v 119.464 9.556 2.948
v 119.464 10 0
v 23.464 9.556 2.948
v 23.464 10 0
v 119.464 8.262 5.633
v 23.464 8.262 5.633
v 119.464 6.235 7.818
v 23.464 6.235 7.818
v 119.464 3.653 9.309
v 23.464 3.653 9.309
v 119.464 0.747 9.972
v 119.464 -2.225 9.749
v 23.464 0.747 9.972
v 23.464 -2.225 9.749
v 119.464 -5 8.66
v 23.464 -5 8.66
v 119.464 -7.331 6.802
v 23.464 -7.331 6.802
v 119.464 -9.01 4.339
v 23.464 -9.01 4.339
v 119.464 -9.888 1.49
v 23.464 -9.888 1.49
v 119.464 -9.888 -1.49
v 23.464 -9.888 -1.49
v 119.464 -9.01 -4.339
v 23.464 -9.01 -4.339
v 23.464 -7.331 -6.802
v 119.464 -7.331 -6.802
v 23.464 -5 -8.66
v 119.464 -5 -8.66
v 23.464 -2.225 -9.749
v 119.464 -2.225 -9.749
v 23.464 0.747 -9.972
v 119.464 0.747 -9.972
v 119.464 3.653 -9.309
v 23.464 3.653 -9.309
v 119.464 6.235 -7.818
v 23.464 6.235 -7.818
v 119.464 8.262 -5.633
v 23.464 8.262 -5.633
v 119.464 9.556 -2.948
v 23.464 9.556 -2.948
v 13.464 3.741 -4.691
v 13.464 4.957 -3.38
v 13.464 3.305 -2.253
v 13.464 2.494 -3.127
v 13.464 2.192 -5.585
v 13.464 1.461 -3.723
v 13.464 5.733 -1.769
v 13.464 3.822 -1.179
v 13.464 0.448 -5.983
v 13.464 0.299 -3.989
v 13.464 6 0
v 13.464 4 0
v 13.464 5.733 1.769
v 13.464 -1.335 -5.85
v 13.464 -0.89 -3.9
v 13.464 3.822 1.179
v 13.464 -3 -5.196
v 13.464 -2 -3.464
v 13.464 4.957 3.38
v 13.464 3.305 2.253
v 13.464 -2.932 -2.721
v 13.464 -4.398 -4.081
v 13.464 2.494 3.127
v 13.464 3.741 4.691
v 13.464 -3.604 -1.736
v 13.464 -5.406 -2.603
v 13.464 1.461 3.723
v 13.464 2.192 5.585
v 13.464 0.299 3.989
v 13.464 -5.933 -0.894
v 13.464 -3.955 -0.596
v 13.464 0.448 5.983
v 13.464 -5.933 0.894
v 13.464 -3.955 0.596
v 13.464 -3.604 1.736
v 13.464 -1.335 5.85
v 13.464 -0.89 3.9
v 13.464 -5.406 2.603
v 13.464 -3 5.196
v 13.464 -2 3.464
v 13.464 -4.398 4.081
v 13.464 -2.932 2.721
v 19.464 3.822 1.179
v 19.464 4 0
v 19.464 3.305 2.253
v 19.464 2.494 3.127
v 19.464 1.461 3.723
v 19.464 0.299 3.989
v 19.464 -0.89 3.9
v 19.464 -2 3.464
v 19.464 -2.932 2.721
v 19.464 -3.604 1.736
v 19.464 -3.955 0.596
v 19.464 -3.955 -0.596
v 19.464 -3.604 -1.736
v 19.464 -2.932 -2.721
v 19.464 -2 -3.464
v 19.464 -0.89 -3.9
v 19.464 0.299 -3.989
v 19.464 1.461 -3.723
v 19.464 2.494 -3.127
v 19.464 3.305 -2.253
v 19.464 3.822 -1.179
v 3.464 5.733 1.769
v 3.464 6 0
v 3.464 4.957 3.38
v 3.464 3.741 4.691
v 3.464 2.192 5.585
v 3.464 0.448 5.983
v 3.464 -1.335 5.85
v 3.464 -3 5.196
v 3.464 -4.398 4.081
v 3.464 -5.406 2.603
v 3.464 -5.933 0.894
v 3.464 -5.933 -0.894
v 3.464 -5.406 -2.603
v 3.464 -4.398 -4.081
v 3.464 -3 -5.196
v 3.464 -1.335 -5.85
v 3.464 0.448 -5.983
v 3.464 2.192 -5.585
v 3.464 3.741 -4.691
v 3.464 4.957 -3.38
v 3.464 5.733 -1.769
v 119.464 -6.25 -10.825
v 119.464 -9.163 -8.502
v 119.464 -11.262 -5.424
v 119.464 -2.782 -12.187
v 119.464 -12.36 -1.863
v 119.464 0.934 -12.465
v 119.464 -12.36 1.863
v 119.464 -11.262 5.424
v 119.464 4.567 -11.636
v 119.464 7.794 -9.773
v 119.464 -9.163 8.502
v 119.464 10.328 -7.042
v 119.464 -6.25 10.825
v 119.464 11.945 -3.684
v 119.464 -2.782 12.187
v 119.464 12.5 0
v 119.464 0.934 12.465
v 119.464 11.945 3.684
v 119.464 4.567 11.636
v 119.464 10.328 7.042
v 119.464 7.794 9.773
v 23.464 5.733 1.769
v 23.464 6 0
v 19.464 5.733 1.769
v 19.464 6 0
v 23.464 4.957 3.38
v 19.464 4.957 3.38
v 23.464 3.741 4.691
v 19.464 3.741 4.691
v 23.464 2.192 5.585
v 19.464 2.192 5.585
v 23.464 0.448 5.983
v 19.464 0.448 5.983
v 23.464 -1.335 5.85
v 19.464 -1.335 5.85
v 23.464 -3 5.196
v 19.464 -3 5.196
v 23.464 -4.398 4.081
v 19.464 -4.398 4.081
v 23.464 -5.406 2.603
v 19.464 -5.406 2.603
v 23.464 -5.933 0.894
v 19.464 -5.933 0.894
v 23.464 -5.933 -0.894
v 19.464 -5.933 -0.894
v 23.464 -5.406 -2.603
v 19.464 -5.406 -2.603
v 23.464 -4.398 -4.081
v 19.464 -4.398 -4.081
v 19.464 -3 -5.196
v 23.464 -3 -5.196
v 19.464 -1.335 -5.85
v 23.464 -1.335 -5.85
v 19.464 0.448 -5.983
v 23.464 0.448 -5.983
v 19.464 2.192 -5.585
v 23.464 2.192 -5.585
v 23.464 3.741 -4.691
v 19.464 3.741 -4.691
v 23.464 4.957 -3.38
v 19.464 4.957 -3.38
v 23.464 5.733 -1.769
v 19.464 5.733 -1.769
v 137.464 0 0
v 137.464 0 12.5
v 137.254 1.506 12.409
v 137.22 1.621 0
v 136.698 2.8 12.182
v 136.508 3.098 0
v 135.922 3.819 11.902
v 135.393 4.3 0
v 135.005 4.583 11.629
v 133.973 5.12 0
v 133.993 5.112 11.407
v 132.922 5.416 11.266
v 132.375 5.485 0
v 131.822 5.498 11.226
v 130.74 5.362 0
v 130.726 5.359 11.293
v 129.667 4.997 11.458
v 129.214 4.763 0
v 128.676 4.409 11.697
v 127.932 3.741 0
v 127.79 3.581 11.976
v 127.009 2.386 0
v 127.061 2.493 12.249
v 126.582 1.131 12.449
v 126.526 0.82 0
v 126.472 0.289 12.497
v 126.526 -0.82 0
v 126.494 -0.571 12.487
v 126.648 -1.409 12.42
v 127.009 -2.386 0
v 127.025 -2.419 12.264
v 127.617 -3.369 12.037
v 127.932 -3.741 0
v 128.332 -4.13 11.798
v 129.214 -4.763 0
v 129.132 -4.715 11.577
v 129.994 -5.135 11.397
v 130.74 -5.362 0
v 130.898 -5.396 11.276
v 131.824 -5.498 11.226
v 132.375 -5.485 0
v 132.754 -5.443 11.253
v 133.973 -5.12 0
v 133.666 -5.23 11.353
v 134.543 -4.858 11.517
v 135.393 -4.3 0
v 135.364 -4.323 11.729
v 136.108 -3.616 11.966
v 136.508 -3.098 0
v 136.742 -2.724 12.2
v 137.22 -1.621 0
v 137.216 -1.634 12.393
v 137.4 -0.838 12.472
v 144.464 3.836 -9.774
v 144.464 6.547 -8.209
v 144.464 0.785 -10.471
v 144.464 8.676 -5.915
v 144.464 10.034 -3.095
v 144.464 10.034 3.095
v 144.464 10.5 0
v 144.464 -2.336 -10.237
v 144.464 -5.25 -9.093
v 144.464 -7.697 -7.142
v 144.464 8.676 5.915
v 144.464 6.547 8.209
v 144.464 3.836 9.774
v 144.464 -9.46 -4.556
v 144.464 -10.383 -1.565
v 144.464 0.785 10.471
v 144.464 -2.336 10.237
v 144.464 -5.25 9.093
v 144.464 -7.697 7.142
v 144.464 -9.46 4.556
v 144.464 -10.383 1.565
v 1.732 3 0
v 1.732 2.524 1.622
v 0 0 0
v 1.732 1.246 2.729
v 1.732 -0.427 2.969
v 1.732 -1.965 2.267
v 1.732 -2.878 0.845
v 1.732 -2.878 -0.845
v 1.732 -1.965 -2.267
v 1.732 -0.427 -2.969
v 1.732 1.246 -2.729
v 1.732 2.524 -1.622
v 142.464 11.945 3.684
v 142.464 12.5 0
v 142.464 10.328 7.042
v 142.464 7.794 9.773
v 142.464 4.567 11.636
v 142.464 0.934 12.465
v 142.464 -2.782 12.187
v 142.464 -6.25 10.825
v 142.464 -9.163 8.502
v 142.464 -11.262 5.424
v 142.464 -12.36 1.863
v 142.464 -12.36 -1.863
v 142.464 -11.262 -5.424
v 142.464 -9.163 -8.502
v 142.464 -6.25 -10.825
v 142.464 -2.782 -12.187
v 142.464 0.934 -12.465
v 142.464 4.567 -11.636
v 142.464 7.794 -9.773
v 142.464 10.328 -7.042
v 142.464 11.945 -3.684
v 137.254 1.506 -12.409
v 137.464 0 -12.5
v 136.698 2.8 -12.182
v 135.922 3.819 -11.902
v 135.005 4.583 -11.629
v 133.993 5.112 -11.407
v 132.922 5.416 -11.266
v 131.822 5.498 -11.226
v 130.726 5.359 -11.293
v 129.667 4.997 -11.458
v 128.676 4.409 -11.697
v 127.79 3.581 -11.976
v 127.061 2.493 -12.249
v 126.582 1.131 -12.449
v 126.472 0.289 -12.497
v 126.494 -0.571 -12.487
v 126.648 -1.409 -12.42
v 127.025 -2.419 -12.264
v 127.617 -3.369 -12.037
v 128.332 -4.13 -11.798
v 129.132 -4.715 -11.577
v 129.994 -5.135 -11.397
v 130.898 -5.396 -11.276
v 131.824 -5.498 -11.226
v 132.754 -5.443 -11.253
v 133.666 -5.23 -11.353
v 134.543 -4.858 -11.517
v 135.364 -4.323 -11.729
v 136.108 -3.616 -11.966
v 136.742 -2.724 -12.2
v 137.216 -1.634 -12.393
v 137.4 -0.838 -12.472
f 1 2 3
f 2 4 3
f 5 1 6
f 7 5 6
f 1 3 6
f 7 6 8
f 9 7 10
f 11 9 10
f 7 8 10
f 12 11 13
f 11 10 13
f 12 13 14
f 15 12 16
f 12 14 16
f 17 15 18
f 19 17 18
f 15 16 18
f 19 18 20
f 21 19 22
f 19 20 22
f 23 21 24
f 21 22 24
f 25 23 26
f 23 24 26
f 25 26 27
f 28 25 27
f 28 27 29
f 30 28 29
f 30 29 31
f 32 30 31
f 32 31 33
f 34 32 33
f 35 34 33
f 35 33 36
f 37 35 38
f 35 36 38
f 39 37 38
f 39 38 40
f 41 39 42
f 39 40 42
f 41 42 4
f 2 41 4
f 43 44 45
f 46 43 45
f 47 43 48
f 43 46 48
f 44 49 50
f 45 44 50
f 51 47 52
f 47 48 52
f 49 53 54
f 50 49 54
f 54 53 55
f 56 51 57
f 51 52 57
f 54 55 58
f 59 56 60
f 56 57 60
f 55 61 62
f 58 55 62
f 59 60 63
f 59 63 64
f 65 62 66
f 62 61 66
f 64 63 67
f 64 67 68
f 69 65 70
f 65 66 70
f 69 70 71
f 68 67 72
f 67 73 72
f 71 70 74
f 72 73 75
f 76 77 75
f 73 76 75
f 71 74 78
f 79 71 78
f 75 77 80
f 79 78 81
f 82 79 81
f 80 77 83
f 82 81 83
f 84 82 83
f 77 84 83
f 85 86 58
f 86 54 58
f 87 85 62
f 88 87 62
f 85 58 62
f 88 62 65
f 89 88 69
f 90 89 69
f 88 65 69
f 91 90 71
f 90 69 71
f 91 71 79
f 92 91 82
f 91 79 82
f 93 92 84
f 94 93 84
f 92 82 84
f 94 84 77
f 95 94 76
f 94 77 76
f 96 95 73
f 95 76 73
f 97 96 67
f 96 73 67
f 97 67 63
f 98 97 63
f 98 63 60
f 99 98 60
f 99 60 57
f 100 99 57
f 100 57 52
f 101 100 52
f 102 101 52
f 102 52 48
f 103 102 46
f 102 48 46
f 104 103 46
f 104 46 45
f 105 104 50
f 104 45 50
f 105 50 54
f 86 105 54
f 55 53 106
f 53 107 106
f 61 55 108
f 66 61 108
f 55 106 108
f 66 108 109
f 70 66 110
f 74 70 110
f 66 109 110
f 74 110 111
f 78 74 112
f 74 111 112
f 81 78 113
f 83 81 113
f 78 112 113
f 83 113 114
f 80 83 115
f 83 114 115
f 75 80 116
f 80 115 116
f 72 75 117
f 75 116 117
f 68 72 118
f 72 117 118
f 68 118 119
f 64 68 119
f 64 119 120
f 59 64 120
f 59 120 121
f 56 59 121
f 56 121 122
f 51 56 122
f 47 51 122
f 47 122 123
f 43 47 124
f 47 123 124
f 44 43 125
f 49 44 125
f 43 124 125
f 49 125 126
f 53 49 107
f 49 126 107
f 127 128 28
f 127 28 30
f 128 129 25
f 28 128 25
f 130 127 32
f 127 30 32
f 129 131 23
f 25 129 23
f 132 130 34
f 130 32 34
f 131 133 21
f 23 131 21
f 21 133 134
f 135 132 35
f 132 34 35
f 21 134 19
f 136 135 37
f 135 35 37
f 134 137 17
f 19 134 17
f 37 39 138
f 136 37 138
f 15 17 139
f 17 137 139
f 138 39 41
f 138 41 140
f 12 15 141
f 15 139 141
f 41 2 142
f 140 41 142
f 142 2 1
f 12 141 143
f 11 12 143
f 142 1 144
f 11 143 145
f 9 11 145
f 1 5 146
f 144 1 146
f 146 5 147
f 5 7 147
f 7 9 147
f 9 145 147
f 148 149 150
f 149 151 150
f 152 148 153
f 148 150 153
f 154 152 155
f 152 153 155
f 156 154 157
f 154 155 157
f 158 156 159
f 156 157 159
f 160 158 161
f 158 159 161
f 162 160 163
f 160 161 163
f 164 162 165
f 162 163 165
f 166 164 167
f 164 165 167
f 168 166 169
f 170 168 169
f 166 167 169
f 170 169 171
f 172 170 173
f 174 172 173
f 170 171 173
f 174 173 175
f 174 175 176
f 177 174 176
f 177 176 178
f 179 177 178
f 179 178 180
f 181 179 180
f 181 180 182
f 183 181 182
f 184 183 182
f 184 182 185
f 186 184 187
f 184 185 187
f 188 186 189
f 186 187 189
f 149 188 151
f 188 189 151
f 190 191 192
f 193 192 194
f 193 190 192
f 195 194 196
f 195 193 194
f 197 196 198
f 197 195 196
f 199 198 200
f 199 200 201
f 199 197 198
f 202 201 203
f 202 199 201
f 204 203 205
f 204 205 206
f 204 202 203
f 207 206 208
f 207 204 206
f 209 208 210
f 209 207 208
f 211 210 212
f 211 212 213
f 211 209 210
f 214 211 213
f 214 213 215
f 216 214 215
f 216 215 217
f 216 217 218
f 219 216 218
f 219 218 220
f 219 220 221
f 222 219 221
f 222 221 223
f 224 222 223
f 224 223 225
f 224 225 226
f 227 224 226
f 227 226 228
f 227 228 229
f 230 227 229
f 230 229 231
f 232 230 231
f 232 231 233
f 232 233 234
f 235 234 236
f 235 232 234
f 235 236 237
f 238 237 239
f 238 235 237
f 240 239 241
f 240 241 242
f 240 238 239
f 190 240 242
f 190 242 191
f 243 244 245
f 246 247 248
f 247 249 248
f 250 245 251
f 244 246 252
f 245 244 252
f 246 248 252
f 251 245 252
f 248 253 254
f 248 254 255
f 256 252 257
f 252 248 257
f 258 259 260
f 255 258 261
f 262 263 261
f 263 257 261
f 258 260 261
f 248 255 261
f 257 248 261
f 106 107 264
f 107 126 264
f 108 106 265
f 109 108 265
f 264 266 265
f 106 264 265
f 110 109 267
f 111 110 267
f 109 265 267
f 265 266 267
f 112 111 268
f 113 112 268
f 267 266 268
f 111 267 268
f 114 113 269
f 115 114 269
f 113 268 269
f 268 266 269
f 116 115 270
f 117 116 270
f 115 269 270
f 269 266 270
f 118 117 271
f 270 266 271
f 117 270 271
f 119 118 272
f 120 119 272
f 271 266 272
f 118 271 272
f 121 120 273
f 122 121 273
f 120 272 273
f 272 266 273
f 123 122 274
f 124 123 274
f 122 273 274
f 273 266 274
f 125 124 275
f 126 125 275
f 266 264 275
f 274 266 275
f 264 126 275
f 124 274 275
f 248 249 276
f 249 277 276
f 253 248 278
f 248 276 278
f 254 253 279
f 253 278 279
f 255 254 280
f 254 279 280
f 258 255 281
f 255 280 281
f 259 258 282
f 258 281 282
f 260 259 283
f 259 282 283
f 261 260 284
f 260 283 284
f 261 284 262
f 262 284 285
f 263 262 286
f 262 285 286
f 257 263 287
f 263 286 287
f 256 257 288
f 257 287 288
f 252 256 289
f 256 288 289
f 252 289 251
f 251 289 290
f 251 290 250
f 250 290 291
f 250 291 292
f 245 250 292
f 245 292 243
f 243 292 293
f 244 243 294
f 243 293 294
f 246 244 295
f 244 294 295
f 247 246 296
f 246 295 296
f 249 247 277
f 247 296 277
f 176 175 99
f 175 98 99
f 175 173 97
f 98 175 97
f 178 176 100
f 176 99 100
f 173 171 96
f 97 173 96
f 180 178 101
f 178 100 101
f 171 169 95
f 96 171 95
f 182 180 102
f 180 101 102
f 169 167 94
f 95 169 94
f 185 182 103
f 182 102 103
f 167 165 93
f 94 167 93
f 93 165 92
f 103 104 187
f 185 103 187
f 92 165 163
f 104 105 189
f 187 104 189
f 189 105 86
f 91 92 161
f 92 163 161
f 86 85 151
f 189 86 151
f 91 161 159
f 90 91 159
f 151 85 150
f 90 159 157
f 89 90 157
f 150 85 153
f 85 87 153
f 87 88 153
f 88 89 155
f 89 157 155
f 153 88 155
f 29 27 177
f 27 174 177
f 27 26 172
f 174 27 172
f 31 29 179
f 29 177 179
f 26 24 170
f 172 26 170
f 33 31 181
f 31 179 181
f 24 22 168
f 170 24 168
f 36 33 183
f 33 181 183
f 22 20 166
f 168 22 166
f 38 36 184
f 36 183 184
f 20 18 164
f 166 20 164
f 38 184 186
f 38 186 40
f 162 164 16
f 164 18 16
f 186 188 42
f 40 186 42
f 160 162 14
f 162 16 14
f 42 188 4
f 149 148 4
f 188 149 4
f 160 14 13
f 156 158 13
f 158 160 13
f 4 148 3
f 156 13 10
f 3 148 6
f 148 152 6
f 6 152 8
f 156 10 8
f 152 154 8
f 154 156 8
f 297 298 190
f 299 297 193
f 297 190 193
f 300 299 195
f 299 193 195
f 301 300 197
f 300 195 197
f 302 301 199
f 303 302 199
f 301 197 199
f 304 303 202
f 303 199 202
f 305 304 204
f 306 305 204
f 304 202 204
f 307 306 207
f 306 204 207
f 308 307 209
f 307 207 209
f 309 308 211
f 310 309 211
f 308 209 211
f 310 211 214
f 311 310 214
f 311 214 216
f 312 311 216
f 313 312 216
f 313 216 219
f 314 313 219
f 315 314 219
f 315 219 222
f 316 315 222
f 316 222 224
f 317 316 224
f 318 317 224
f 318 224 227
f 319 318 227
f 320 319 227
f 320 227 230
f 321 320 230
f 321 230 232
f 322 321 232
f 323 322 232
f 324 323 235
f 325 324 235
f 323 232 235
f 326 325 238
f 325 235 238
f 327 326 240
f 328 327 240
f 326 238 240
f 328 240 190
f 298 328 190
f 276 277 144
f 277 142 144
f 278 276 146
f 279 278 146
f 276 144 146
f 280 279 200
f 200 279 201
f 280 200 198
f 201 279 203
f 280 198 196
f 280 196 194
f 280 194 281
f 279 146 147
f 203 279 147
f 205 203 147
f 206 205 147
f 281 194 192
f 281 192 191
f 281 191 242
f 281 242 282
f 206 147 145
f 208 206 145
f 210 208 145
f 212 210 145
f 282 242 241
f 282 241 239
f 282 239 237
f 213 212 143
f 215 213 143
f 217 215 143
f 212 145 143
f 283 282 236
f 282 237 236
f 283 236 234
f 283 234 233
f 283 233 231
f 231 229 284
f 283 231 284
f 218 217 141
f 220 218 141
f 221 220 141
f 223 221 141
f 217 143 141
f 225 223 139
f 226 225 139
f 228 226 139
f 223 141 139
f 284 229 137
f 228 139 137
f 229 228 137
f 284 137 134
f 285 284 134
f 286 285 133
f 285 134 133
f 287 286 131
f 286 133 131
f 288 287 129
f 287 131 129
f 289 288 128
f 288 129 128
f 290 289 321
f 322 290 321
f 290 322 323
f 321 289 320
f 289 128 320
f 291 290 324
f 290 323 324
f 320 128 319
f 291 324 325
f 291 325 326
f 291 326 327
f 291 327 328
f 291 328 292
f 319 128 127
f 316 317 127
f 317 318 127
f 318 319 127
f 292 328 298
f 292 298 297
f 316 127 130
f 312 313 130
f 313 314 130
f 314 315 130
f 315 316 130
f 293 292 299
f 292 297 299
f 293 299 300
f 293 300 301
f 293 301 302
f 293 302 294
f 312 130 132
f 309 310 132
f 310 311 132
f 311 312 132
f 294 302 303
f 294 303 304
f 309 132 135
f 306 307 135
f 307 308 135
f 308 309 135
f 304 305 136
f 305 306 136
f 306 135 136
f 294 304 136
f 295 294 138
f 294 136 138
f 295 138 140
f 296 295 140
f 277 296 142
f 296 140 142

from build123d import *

# Parameters (mm, degrees)
SKETCH2_R               = 5.5
CUT_EXTRUDE1_DEPTH      = 13.5
CUT_EXTRUDE1_DEPTH_BACK = 13.5


with BuildPart() as part:
    # Sketch1 → Revolve1 (revolve)
    with BuildSketch(Plane.XY):
        Polygon((3.464101615, 6), (0, 0), (144.464101615, 0), (144.464101615, 10.5), (142.464101615, 12.5), (119.464101615, 12.5), (119.464101615, 10), (23.464101615, 10), (23.464101615, 6), (19.464101615, 6), (19.464101615, 4), (13.464101615, 4), (13.464101615, 6), align=None)
    revolve(axis=Axis((0, 0, 0), (1, 0, 0)))

    # Sketch2 → Cut-Extrude1 (cut, two sides)
    with BuildSketch(Plane.XY) as cut_extrude1_sk:
        with Locations((131.964101615, 0)):
            Circle(SKETCH2_R)
    extrude(amount=CUT_EXTRUDE1_DEPTH, mode=Mode.SUBTRACT)
    extrude(cut_extrude1_sk.sketch, amount=-CUT_EXTRUDE1_DEPTH_BACK, mode=Mode.SUBTRACT)


solid = part.part
